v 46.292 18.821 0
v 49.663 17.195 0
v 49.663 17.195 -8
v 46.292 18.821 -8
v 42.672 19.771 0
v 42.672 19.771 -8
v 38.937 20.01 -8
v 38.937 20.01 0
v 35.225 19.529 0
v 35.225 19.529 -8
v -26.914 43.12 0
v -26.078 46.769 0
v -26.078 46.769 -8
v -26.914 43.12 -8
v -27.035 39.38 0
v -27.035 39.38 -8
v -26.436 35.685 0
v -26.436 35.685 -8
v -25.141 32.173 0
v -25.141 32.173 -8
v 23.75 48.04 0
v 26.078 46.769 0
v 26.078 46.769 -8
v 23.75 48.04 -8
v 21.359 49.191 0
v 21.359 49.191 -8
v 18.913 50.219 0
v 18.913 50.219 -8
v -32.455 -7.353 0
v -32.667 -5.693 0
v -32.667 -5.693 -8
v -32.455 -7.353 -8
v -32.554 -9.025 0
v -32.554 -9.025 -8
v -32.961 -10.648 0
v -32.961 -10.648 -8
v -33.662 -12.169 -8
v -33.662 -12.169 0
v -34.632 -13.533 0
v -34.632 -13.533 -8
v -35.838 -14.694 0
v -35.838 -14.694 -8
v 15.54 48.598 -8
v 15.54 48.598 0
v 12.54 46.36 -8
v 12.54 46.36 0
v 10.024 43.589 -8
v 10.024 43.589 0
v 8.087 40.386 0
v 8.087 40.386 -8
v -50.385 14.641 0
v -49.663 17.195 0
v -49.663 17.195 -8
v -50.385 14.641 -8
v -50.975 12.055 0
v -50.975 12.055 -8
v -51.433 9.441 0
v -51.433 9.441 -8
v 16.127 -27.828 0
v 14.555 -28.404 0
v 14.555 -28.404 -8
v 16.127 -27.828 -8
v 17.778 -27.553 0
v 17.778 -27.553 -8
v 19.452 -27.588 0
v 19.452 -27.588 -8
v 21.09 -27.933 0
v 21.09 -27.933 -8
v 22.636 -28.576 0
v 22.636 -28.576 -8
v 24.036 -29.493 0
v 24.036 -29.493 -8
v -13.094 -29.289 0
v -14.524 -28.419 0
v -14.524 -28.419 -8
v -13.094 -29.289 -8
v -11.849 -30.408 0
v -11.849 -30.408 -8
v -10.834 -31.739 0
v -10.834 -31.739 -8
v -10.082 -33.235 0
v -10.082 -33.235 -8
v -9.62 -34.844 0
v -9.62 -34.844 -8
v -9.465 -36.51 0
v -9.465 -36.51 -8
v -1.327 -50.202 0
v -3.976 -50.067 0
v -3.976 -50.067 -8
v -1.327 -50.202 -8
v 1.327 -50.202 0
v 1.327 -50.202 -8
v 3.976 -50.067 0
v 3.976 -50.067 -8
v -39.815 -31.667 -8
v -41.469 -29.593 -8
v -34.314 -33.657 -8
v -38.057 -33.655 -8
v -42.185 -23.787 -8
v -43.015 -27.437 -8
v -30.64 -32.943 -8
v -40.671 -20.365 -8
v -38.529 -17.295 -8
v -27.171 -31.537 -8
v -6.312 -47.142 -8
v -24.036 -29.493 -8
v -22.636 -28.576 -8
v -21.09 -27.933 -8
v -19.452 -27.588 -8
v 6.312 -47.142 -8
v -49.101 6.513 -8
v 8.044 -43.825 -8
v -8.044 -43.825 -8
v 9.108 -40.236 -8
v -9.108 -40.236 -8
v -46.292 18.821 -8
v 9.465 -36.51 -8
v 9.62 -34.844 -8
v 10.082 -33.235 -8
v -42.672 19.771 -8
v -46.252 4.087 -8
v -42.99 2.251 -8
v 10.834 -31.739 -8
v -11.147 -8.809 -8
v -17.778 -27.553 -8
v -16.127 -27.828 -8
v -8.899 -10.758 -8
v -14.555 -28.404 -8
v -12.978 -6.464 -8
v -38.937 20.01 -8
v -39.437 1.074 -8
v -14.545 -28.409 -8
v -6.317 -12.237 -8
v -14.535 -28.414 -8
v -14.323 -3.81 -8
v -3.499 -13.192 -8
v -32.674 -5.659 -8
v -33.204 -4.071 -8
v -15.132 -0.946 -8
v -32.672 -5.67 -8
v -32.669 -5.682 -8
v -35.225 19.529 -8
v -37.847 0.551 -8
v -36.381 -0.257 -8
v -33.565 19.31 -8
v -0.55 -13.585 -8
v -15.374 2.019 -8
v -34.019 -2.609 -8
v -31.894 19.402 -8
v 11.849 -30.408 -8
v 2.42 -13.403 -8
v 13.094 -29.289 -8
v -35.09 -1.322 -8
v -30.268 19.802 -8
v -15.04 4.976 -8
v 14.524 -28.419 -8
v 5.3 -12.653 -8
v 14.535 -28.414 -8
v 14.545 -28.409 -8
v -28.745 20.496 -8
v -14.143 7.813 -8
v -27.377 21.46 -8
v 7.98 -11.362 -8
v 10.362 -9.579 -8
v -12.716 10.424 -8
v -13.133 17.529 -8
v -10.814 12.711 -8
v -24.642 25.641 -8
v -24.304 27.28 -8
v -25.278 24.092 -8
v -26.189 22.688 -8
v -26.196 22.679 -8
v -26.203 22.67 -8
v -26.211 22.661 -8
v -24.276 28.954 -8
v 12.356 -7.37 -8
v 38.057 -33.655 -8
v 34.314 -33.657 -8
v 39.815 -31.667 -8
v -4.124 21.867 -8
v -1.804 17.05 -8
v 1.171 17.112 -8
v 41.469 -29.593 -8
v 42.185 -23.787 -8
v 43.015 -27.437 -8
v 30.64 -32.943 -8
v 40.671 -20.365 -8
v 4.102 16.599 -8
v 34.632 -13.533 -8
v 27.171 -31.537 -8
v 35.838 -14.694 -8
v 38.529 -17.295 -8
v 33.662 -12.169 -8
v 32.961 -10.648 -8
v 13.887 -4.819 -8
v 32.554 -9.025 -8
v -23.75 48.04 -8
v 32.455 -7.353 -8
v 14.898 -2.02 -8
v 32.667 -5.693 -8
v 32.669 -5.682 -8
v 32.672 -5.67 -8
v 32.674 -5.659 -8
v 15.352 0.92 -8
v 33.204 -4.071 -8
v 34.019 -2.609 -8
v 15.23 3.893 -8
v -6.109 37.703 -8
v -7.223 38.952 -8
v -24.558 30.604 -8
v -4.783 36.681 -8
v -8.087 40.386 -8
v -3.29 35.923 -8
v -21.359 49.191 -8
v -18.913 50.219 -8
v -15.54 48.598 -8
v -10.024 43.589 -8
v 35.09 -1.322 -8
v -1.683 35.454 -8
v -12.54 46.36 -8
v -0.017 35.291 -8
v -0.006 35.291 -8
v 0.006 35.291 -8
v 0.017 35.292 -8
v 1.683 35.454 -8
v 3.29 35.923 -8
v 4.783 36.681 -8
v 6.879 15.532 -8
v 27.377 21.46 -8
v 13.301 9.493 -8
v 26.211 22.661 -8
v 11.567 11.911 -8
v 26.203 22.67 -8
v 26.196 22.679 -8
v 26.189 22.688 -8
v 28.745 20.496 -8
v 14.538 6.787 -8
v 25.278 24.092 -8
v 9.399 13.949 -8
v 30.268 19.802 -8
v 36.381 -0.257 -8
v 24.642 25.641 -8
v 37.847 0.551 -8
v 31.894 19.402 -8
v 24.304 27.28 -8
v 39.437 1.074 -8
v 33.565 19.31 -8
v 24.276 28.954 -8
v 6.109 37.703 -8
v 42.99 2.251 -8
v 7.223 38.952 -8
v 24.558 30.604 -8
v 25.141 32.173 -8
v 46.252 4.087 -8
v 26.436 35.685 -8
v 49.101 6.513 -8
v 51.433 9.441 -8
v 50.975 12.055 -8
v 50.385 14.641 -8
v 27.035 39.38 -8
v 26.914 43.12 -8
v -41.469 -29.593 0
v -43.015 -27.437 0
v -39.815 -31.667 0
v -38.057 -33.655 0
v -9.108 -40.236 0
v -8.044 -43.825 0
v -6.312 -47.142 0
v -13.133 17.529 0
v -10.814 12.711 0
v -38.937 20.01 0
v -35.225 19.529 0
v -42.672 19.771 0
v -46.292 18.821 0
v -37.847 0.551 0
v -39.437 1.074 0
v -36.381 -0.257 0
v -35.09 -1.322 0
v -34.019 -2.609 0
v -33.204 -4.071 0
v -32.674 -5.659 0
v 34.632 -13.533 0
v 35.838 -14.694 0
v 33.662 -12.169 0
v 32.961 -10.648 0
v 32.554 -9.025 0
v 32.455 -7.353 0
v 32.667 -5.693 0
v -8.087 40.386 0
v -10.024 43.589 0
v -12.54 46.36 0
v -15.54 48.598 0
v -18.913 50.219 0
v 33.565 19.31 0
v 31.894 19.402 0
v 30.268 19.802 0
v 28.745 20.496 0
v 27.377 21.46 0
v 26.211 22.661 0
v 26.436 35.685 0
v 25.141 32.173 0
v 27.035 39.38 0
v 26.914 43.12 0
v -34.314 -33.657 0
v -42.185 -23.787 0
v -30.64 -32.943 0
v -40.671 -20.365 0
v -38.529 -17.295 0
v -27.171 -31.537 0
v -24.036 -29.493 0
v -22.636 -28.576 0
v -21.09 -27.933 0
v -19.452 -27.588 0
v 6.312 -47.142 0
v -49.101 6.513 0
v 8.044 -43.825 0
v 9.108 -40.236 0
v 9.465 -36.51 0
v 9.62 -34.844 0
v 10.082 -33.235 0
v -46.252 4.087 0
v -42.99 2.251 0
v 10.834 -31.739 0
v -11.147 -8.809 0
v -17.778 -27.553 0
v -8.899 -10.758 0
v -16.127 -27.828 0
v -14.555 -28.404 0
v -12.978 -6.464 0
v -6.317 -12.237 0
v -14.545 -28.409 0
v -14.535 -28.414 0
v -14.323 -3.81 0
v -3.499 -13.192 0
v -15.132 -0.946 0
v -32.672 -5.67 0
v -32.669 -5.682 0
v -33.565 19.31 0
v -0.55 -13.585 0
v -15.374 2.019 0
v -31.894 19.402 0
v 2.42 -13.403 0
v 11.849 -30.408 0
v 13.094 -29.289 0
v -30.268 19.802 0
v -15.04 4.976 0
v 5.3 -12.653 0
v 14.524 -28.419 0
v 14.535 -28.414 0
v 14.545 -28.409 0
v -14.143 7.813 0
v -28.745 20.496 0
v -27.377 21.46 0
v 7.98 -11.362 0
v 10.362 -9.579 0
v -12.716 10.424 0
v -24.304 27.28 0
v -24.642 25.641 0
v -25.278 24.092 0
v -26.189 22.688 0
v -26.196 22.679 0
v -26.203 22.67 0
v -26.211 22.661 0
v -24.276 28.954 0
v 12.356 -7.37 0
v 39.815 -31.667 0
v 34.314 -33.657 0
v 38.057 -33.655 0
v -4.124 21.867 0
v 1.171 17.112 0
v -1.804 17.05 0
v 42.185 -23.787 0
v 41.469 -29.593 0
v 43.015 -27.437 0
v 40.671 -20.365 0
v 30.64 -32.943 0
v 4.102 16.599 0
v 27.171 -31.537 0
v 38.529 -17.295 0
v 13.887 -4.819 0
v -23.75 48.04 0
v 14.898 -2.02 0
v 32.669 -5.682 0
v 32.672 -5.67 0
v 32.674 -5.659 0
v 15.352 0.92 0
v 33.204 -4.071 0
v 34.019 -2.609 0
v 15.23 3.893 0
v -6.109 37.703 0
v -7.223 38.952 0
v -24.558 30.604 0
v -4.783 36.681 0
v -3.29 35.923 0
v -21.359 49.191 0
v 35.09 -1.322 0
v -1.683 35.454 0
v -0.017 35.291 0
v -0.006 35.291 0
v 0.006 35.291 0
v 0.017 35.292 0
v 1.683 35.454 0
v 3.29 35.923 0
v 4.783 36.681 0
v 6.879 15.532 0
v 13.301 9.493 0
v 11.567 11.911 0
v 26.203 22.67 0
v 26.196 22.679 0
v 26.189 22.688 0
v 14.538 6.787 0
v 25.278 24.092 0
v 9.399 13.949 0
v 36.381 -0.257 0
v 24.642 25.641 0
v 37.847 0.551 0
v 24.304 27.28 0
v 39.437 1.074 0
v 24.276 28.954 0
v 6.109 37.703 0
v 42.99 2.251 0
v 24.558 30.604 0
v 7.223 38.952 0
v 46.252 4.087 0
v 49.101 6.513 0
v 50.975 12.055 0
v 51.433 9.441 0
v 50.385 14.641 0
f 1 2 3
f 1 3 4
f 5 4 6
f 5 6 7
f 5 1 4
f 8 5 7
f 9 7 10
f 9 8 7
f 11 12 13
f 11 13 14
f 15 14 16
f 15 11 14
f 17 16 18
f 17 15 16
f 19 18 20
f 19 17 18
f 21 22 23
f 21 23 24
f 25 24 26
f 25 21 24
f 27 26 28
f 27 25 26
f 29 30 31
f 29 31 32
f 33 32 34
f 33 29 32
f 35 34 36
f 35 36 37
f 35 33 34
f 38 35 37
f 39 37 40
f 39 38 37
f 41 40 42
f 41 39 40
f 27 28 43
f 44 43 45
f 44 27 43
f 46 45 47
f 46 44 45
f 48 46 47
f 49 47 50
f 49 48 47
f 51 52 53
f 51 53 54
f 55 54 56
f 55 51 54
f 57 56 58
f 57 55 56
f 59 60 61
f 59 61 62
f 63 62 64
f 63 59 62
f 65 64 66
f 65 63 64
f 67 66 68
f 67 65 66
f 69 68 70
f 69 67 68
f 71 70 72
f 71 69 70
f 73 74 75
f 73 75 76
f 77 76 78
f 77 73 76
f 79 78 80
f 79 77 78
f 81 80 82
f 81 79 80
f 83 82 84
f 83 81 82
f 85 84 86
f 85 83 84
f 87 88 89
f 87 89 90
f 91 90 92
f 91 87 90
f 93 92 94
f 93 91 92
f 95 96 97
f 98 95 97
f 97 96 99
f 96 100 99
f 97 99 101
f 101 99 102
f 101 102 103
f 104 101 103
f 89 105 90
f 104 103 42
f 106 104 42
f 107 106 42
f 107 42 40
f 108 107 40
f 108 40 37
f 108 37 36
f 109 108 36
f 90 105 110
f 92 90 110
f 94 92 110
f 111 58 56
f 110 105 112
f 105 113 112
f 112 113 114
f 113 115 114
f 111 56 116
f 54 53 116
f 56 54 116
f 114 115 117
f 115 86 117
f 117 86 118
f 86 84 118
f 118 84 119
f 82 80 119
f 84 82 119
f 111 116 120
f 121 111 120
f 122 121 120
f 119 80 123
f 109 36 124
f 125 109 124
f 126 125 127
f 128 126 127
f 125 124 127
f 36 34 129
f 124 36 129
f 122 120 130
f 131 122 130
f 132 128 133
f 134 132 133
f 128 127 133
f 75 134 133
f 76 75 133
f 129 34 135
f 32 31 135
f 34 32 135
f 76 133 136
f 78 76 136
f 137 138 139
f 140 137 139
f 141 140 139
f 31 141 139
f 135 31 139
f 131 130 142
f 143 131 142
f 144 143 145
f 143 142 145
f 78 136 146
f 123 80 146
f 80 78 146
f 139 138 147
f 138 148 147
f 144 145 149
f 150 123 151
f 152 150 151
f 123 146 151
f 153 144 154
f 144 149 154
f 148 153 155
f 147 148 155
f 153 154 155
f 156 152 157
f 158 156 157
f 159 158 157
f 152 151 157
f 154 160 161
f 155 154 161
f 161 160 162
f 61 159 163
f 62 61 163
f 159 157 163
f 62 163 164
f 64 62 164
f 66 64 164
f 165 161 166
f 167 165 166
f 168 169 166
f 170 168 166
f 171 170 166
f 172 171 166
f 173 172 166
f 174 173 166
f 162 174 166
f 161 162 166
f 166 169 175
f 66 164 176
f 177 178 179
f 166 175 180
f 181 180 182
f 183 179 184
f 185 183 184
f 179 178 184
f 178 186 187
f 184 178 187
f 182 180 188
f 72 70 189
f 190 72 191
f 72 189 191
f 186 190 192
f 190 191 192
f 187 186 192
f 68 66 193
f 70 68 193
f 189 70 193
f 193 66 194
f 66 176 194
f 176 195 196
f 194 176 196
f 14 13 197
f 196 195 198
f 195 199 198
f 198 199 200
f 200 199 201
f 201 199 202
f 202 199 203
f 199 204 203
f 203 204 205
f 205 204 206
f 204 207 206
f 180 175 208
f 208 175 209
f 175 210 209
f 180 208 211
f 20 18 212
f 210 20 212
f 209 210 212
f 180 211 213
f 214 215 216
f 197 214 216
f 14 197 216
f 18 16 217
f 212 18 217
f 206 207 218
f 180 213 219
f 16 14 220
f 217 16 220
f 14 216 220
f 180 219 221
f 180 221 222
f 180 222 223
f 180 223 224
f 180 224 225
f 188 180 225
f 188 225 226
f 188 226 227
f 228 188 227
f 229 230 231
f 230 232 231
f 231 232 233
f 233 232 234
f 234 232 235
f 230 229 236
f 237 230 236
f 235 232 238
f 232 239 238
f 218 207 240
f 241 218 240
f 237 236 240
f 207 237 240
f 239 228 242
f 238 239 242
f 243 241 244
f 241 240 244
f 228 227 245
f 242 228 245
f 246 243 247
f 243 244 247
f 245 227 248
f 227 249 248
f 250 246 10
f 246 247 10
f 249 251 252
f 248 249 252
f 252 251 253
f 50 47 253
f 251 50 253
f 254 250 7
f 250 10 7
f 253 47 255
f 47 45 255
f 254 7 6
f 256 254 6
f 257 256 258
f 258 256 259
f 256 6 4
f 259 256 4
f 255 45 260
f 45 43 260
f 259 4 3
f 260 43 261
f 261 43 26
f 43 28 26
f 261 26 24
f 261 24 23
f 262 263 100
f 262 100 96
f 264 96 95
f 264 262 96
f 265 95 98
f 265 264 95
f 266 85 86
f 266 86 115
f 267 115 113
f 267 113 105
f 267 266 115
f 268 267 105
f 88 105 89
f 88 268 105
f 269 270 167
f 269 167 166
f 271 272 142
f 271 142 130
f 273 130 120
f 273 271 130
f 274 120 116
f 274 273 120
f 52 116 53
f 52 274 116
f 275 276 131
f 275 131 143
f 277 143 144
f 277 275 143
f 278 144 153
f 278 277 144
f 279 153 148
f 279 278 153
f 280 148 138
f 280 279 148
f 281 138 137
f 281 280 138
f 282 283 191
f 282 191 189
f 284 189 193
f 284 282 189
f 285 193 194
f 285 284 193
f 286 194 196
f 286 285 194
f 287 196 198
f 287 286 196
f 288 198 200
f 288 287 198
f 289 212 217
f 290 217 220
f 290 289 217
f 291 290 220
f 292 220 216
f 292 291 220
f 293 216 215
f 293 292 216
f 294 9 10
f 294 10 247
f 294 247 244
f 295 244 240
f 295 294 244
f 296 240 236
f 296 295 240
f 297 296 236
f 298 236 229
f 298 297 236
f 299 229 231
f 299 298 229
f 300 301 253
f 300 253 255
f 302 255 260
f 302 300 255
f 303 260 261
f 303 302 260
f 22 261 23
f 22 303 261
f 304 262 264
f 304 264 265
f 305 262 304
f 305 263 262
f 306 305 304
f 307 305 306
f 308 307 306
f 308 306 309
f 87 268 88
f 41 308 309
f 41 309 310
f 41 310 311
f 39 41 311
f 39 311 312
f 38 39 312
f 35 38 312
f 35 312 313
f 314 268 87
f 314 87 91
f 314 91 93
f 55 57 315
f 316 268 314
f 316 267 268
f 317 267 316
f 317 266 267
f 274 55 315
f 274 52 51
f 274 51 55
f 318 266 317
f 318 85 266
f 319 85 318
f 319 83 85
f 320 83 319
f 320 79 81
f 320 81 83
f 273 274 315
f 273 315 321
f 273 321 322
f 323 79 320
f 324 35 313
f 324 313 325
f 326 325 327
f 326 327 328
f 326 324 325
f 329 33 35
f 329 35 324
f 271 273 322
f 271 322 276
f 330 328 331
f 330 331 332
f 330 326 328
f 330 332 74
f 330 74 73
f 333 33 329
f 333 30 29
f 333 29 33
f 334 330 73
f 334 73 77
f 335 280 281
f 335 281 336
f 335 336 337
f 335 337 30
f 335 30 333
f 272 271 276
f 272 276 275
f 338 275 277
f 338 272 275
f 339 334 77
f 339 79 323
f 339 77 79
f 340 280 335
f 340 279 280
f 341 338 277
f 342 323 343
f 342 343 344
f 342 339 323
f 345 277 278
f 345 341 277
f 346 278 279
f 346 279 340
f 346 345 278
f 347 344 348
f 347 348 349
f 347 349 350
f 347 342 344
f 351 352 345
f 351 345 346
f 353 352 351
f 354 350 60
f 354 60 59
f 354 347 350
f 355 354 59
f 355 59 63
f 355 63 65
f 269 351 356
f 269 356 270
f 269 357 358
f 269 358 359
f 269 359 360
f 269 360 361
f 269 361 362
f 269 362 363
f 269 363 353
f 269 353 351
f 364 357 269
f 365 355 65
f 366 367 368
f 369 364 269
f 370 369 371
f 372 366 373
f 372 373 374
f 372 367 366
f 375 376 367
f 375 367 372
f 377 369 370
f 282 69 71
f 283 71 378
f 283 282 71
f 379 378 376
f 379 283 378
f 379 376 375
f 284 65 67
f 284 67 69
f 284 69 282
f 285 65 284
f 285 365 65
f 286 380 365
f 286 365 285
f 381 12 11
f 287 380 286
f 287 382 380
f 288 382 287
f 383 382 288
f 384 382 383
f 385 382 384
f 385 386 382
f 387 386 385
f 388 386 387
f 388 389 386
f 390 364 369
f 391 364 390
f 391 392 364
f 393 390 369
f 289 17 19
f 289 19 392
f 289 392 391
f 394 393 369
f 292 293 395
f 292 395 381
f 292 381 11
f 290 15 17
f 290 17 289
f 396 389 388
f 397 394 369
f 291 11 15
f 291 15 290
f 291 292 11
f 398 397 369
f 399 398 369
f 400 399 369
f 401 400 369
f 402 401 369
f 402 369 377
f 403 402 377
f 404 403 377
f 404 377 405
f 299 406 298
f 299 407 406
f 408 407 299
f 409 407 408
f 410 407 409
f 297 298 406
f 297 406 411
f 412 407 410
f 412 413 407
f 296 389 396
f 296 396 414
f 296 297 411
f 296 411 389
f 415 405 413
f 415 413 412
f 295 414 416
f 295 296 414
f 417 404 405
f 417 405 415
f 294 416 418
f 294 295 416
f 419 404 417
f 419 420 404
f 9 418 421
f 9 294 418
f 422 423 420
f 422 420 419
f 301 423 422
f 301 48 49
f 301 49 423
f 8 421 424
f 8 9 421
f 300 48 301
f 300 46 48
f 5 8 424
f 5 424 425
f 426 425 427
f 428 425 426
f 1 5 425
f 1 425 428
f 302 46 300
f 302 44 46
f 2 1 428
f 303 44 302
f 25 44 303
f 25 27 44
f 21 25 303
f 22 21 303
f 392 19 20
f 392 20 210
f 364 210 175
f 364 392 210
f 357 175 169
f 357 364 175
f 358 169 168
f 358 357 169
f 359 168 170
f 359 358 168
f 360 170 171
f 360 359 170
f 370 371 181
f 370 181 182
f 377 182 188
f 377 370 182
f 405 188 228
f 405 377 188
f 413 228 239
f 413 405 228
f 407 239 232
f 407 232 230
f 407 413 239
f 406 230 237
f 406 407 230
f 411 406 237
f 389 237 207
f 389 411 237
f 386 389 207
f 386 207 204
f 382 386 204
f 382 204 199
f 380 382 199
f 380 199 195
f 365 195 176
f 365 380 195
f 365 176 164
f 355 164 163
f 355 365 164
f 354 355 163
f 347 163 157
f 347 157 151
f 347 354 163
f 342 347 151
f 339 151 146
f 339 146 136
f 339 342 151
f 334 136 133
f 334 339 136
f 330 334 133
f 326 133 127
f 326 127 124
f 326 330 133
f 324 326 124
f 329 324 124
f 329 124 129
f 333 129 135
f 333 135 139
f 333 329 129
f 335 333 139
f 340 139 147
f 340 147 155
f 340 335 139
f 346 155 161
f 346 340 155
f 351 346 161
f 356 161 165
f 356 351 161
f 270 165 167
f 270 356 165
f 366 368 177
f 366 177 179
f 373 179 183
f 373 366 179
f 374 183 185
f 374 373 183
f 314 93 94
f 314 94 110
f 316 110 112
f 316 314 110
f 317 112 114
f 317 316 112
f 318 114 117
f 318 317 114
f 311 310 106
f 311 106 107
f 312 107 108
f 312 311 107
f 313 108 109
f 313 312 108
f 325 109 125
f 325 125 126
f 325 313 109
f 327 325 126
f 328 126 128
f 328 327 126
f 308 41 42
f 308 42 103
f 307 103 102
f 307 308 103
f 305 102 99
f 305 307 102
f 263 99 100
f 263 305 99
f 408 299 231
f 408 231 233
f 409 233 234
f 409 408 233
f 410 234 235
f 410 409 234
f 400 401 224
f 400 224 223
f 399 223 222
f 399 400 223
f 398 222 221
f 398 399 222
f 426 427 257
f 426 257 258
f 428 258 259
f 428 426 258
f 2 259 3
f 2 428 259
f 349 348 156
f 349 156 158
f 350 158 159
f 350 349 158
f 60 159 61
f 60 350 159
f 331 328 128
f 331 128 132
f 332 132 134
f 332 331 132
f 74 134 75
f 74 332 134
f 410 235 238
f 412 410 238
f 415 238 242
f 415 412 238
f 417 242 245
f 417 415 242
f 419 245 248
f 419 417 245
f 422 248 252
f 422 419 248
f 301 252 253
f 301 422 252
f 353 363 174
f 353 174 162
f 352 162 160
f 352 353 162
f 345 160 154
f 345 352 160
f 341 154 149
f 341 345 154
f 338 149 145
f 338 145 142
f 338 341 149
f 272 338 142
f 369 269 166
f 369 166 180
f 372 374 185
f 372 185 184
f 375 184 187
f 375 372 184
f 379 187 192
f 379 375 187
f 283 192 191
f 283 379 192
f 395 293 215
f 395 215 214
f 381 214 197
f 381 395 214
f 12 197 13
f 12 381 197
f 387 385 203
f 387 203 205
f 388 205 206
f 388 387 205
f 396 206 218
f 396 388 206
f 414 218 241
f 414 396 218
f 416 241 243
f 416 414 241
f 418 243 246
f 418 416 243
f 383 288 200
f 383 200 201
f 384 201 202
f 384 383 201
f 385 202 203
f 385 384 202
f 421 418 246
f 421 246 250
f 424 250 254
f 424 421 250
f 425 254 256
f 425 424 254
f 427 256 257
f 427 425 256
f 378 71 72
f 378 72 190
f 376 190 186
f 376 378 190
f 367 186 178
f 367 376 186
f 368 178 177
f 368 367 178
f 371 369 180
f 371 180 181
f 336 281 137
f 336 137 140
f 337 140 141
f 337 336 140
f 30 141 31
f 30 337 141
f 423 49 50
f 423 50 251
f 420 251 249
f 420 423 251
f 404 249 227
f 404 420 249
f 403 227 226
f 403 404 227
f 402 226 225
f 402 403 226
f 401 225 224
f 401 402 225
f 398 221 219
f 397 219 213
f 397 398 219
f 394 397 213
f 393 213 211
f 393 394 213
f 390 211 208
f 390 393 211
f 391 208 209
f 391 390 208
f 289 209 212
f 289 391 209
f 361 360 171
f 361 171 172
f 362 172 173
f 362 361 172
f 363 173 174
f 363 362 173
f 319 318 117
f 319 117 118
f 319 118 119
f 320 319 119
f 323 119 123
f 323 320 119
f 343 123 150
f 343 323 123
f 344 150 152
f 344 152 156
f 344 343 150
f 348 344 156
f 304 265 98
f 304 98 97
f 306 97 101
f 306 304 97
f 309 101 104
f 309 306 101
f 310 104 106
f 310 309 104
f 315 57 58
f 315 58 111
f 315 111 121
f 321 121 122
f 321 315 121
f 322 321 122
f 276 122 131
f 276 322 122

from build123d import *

# Parameters (mm, degrees)
F1_DEPTH = 8


# Not quite as in the source:
# - ends of sketch curves that miss each other by under 0.0002 mm in the source are joined


with BuildPart() as f1:
    # F0 (on Top) → F1 (new body)
    with BuildSketch(Plane.XY):
        with BuildLine():
            ThreePointArc((0.0173106263, 35.2915124556), (-6.457e-07, 35.2914532257), (-0.0173119996, 35.2914272939))
            ThreePointArc((-0.0173119996, 35.2914272939), (-4.7828415657, 36.6814206792), (-8.0865831016, 40.3864729511))
            ThreePointArc((-8.0865831016, 40.3864729511), (-12.5400209066, 46.3598395768), (-18.9133471994, 50.2192344565))
            ThreePointArc((-18.9133471994, 50.2192344565), (-22.5619545404, 48.6311460797), (-26.0784416984, 46.7687064797))
            ThreePointArc((-26.0784416984, 46.7687064797), (-27.0347490245, 39.379546207), (-25.1412558363, 32.173375079))
            ThreePointArc((-25.1412558363, 32.173375079), (-24.3043791298, 27.2803437578), (-26.1889642235, 22.6879091335))
            ThreePointArc((-26.1889642235, 22.6879091335), (-26.1997114341, 22.6743379832), (-26.2105512359, 22.6608403006))
            ThreePointArc((-26.2105512359, 22.6608403006), (-30.268483933, 19.8015929347), (-35.2250588486, 19.5286856632))
            ThreePointArc((-35.2250588486, 19.5286856632), (-42.6718988891, 19.7711813344), (-49.6630001039, 17.1946071711))
            ThreePointArc((-49.6630001039, 17.1946071711), (-50.6962513252, 13.3518540399), (-51.4326312922, 9.4413418946))
            ThreePointArc((-51.4326312922, 9.4413418946), (-46.2518013791, 4.086604184), (-39.4372158458, 1.0740226787))
            ThreePointArc((-39.4372158458, 1.0740226787), (-35.0899055663, -1.3224359394), (-32.6744151986, -5.6592003729))
            ThreePointArc((-32.6744151986, -5.6592003729), (-32.6705053342, -5.676064432), (-32.6666279149, -5.6929359805))
            ThreePointArc((-32.6666279149, -5.6929359805), (-32.9613409881, -10.648285961), (-35.8383477489, -14.6936473148))
            ThreePointArc((-35.8383477489, -14.6936473148), (-40.6709671644, -20.3646275254), (-43.0154005889, -27.4369580526))
            ThreePointArc((-43.0154005889, -27.4369580526), (-40.655237183, -30.6407045779), (-38.0570010523, -33.6545940487))
            ThreePointArc((-38.0570010523, -33.6545940487), (-30.6403035701, -32.942681267), (-24.0361481426, -29.4931378216))
            ThreePointArc((-24.0361481426, -29.4931378216), (-19.4520178261, -27.5884419734), (-14.5553656824, -28.4038640421))
            ThreePointArc((-14.5553656824, -28.4038640421), (-14.539742708, -28.4113209434), (-14.5241712519, -28.4188855039))
            ThreePointArc((-14.5241712519, -28.4188855039), (-10.8336363316, -31.7388351981), (-9.46463, -36.510411))
            ThreePointArc((-9.46463, -36.510411), (-8.0439677673, -43.8245030704), (-3.9763277521, -50.0669807595))
            ThreePointArc((-3.9763277521, -50.0669807595), (-4.985e-07, -50.219235), (3.9763270429, -50.066981559))
            ThreePointArc((3.9763270429, -50.066981559), (8.0439676368, -43.8245033926), (9.4646296494, -36.5104109994))
            ThreePointArc((9.4646296494, -36.5104109994), (10.8336355705, -31.738834816), (14.5241710621, -28.4188851093))
            ThreePointArc((14.5241710621, -28.4188851093), (14.5397421135, -28.4113207469), (14.555327686, -28.4037863488))
            ThreePointArc((14.555327686, -28.4037863488), (19.4520168261, -27.5884419734), (24.0361467636, -29.4931382964))
            ThreePointArc((24.0361467636, -29.4931382964), (30.6403030472, -32.9426814086), (38.0570009358, -33.6545933411))
            ThreePointArc((38.0570009358, -33.6545933411), (40.655237183, -30.6407045779), (43.0154002031, -27.436958138))
            ThreePointArc((43.0154002031, -27.436958138), (40.6709661644, -20.3646275254), (35.8383467951, -14.6936472574))
            ThreePointArc((35.8383467951, -14.6936472574), (32.9613408944, -10.6482856952), (32.6667108543, -5.6929547524))
            ThreePointArc((32.6667108543, -5.6929547524), (32.6705043598, -5.6760643215), (32.67441425, -5.659200152))
            ThreePointArc((32.67441425, -5.659200152), (35.0899046467, -1.3224358594), (39.4372149344, 1.0740222872))
            ThreePointArc((39.4372149344, 1.0740222872), (46.2518003791, 4.086604184), (51.4326310926, 9.4413419398))
            ThreePointArc((51.4326310926, 9.4413419398), (50.6962513088, 13.3518541117), (49.6629990471, 17.1946070146))
            ThreePointArc((49.6629990471, 17.1946070146), (42.6718983702, 19.7711812567), (35.2250588084, 19.5286858355))
            ThreePointArc((35.2250588084, 19.5286858355), (30.2684833934, 19.8015927747), (26.2105502359, 22.6608403006))
            ThreePointArc((26.2105502359, 22.6608403006), (26.1997106027, 22.6743373459), (26.1889636103, 22.687908644))
            ThreePointArc((26.1889636103, 22.687908644), (24.3043781641, 27.2803434477), (25.1412552893, 32.1733748607))
            ThreePointArc((25.1412552893, 32.1733748607), (27.0347490207, 39.3795461477), (26.0784413783, 46.768707126))
            ThreePointArc((26.0784413783, 46.768707126), (22.5619541507, 48.6311462674), (18.9133467528, 50.2192343669))
            ThreePointArc((18.9133467528, 50.2192343669), (12.5400199066, 46.3598395768), (8.0865821819, 40.3864729126))
            ThreePointArc((8.0865821819, 40.3864729126), (4.7828405657, 36.6814206792), (0.0173106263, 35.2915124556))
        make_face()
        with BuildLine():
            Line((-10.813517, 12.711431), (-13.133307, 17.528522))
            Line((-13.133307, 17.528522), (-4.123619, 21.867361))
            Line((-4.123619, 21.867361), (-1.803829, 17.050271))
            ThreePointArc((-1.803829, 17.050271), (6.6712619157, -12.0722441106), (-10.813517, 12.711431))
        make_face(mode=Mode.SUBTRACT)
    extrude(amount=-F1_DEPTH)


solid = f1.part
